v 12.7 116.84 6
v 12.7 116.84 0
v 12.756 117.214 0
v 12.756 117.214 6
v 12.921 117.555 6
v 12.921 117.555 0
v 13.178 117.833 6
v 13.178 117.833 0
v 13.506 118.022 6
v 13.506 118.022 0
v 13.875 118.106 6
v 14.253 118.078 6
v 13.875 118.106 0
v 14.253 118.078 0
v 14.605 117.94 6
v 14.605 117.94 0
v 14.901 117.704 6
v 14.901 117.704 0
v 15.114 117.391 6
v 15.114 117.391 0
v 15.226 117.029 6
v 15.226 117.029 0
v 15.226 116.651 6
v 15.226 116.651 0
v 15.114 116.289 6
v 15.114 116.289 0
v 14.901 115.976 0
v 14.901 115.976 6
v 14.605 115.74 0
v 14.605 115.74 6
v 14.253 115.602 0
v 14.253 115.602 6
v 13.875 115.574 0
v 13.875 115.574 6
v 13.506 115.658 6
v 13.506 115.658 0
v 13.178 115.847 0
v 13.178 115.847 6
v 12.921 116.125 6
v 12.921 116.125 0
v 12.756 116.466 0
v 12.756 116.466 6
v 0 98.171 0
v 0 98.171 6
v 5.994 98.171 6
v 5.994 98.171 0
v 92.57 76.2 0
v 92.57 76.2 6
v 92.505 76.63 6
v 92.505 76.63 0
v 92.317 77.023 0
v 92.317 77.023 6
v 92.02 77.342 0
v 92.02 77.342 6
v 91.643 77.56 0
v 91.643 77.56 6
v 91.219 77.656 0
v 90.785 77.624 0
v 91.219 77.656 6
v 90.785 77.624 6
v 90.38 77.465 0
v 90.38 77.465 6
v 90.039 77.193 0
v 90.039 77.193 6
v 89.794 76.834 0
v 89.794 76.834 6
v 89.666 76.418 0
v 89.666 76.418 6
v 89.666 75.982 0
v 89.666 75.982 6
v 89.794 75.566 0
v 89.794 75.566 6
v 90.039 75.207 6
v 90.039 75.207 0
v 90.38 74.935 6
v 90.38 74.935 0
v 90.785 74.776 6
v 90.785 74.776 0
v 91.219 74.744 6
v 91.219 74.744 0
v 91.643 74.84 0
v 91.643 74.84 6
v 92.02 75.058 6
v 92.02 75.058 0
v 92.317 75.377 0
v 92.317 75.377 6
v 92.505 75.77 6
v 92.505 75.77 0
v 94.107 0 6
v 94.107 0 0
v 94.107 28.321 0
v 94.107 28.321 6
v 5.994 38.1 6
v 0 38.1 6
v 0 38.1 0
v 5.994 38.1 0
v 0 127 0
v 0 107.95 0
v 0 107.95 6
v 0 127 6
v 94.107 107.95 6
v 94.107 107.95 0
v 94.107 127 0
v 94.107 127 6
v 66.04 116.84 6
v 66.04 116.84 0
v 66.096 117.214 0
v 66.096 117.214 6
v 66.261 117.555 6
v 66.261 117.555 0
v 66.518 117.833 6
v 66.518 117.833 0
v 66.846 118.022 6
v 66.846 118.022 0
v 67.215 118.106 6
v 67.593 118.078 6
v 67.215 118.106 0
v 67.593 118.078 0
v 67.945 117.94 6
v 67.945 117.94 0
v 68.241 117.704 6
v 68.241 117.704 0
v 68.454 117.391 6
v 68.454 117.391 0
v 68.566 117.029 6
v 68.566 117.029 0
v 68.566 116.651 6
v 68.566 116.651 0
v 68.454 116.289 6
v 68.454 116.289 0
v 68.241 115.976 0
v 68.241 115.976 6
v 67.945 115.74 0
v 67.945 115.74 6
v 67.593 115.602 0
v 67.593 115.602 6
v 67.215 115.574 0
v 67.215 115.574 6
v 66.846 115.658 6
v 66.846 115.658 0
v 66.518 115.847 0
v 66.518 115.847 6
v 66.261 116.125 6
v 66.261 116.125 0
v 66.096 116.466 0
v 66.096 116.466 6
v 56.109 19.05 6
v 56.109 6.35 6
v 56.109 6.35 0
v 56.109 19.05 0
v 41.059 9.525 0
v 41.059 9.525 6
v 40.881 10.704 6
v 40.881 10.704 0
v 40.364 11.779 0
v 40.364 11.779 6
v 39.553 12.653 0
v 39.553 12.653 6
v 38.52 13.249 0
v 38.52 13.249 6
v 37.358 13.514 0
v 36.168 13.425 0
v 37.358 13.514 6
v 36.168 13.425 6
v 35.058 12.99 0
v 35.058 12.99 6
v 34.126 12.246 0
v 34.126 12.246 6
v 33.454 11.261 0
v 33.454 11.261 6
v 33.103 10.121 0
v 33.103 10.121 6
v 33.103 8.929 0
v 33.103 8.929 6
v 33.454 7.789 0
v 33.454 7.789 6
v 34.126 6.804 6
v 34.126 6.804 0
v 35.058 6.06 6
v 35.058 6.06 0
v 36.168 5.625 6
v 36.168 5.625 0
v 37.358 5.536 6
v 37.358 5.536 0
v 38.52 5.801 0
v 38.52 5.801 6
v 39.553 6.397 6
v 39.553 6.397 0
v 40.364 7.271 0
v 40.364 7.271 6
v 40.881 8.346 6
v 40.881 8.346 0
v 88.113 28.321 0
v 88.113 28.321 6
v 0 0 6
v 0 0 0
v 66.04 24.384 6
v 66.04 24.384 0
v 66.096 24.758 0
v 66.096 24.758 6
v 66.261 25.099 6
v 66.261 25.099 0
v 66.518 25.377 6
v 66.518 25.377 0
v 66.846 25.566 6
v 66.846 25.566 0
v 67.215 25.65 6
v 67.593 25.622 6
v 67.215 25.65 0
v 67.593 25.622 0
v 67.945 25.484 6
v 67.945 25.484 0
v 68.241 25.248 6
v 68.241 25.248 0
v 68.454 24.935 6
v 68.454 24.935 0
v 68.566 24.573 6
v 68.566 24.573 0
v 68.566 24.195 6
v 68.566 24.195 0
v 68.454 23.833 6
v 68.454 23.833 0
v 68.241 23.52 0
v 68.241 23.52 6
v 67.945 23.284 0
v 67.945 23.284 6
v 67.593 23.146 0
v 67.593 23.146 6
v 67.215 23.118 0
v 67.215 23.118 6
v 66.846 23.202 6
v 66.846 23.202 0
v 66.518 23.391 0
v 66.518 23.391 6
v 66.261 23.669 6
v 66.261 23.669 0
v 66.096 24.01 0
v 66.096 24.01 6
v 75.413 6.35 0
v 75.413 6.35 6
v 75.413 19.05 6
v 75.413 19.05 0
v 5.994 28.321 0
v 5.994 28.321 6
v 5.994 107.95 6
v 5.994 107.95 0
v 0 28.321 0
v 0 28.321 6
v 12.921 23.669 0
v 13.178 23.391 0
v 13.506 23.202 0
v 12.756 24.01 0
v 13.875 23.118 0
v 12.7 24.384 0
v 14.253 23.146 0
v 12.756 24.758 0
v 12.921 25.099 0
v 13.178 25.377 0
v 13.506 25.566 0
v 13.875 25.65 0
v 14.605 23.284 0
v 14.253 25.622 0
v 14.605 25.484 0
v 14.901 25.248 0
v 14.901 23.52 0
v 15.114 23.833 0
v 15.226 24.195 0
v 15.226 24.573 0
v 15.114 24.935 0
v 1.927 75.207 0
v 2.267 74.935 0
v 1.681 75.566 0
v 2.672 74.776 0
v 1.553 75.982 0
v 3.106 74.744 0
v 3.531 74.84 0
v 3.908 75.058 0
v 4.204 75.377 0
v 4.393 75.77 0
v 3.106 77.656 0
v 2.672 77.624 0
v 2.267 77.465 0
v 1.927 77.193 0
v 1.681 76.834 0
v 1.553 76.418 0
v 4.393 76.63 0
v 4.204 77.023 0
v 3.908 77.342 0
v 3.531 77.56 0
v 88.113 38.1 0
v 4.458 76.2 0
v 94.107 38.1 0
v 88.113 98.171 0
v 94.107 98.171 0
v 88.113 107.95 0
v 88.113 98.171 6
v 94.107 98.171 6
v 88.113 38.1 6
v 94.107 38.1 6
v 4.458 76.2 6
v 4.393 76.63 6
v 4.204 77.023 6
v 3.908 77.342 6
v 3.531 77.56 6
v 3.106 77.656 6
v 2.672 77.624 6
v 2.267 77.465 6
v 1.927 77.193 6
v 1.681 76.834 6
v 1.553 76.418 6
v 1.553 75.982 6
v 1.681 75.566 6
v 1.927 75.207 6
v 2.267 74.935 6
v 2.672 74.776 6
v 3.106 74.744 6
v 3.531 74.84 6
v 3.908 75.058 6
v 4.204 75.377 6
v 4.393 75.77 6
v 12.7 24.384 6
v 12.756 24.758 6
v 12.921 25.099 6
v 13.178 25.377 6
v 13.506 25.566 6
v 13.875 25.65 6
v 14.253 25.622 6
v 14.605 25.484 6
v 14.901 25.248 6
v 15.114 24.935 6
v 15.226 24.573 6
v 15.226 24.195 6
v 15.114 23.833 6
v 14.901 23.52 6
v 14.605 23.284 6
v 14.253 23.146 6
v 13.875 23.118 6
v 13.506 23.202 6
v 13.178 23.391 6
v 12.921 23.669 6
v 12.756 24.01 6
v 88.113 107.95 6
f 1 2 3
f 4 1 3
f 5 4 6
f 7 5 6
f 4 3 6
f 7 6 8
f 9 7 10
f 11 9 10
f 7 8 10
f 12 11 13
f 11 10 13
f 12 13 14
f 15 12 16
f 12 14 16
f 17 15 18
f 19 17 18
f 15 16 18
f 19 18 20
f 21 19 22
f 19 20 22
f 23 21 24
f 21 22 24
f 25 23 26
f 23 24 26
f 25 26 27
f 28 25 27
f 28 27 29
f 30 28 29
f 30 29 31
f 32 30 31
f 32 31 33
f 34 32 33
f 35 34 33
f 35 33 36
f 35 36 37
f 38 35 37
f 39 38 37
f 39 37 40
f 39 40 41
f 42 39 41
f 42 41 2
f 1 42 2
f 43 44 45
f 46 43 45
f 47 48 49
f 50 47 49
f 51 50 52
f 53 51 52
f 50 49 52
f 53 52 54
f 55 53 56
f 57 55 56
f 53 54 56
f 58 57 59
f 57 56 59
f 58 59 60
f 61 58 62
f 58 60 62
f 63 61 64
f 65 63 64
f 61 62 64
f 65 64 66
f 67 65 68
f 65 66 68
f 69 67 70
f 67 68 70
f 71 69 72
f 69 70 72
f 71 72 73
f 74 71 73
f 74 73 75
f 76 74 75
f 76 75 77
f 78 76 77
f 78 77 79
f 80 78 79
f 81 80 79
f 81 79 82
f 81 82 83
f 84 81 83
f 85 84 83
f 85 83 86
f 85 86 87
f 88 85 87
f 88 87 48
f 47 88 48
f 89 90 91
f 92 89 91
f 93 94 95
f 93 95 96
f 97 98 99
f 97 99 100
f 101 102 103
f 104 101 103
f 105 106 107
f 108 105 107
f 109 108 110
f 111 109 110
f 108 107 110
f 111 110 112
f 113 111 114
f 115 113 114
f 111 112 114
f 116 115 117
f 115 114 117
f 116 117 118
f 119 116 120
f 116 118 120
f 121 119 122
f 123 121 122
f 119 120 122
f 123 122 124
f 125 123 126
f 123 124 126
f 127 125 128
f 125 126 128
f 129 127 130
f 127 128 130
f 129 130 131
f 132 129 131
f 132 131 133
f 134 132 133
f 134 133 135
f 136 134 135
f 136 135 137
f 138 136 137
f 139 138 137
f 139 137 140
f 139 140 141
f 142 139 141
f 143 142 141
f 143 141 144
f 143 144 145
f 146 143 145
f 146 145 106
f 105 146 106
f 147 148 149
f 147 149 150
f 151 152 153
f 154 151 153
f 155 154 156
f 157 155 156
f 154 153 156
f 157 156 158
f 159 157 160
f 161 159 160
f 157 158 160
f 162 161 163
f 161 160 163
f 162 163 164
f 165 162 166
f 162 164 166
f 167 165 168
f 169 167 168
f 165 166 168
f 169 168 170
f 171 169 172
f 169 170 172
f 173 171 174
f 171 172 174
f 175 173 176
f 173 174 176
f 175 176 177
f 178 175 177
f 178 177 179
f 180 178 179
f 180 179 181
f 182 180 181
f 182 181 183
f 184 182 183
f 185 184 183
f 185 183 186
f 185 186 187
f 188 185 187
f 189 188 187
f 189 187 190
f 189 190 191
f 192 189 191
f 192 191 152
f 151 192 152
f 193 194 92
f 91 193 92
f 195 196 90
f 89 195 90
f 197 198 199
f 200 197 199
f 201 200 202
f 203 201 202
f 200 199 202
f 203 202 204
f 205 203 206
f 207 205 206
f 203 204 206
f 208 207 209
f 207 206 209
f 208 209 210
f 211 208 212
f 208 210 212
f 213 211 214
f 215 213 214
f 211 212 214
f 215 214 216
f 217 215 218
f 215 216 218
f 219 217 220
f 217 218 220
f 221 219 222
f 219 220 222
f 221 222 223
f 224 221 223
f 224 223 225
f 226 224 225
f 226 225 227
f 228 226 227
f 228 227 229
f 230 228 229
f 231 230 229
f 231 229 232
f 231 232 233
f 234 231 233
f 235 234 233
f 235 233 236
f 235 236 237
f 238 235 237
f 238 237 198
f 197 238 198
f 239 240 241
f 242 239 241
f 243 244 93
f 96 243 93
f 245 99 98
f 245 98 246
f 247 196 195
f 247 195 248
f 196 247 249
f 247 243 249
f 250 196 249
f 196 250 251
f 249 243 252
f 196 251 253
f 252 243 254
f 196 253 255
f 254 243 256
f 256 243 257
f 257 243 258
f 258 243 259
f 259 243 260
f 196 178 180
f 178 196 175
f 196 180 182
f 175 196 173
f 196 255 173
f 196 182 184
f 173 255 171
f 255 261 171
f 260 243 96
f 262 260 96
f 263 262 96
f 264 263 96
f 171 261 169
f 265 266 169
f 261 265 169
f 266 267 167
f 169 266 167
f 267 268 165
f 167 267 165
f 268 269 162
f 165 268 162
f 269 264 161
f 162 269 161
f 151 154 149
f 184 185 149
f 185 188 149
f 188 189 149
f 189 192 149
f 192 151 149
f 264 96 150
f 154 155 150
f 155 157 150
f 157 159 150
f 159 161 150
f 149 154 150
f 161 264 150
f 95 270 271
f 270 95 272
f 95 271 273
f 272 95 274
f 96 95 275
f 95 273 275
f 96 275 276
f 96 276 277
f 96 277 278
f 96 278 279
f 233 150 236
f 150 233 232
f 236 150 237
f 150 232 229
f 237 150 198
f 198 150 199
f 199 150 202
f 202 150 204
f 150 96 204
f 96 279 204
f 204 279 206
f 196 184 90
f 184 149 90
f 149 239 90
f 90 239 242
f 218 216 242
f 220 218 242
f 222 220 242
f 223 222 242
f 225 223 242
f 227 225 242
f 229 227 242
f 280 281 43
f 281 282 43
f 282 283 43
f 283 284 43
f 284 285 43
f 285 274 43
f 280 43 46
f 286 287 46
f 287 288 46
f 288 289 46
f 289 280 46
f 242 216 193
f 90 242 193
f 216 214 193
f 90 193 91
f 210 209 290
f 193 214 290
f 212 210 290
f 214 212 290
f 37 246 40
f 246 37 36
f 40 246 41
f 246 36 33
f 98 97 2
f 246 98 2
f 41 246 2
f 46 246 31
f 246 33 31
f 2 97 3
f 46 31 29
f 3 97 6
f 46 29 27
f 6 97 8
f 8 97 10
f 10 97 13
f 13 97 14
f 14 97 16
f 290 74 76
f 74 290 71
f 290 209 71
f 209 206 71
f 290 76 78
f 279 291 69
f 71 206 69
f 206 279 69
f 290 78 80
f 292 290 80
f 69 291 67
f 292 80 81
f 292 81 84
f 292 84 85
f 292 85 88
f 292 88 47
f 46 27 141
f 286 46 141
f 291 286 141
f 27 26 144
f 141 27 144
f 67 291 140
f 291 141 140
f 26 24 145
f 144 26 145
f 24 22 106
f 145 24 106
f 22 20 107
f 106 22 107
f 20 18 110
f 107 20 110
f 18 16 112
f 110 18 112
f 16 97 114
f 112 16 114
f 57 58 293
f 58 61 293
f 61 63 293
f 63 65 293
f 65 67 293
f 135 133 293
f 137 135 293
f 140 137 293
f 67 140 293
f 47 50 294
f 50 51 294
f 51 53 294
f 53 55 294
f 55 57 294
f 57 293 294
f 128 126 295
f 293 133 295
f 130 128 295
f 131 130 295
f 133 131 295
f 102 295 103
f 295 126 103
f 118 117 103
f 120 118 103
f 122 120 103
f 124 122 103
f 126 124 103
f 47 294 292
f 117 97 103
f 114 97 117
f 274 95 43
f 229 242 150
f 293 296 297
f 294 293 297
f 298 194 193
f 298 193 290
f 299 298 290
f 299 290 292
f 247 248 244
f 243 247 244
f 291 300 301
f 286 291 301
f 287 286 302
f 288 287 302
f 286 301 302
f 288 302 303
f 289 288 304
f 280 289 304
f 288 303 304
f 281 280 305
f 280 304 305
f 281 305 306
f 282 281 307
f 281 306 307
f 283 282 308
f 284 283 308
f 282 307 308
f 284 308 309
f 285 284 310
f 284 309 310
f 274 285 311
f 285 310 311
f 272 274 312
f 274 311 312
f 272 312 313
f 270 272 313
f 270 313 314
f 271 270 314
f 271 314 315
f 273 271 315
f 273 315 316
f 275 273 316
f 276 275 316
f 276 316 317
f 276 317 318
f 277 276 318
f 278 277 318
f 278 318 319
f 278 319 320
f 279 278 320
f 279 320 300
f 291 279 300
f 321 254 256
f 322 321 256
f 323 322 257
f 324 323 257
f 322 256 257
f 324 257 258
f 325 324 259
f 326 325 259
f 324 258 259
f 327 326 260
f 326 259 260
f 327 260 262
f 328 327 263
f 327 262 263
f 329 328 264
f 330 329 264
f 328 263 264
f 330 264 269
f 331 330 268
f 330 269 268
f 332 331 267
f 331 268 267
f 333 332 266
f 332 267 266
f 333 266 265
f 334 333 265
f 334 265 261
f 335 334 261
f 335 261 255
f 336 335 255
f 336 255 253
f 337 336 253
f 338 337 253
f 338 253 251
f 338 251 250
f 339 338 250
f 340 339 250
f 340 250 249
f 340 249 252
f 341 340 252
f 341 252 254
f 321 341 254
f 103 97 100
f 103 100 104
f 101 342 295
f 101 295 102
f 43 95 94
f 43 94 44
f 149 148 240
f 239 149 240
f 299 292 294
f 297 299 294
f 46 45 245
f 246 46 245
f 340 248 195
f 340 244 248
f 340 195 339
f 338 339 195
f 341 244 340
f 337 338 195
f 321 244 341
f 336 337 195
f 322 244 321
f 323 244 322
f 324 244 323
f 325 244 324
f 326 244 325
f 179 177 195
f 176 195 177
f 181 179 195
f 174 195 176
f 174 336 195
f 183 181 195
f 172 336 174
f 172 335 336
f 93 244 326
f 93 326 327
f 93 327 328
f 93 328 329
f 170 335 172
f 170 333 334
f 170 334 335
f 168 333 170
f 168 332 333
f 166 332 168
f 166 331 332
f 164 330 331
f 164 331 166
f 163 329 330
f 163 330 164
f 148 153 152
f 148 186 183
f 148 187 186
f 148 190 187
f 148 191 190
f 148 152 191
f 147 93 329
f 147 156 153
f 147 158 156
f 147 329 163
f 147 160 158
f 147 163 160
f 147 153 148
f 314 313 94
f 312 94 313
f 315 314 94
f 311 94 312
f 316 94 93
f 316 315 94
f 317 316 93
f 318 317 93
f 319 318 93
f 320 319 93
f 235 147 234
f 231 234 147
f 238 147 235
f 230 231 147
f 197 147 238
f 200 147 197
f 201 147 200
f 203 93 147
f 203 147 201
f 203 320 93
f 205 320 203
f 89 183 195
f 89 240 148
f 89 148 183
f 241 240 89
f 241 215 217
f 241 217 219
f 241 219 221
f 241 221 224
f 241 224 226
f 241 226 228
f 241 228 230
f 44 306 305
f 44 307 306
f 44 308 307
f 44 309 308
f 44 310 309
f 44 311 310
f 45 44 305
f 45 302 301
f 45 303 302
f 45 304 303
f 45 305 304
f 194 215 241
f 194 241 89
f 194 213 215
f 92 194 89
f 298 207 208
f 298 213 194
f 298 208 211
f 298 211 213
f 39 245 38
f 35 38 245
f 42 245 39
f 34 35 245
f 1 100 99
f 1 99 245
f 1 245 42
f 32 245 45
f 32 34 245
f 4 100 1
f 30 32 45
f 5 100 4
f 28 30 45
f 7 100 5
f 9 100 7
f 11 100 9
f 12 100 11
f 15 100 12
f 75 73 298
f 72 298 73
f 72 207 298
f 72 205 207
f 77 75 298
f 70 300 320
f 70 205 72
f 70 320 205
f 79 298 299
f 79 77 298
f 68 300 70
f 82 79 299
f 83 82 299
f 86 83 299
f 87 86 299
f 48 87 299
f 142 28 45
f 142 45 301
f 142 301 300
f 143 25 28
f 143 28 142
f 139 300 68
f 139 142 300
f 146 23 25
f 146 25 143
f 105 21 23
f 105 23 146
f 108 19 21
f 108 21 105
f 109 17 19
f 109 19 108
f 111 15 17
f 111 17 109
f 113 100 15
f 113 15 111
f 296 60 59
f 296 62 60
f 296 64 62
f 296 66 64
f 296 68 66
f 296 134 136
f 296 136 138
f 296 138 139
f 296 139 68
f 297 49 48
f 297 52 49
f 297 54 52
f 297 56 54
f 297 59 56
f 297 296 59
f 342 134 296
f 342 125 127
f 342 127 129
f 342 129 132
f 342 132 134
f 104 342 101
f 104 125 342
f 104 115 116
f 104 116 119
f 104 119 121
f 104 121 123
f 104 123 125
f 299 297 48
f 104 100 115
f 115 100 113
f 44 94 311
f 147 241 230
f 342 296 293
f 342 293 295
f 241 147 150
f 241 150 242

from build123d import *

# Parameters (mm, degrees)
SKETCH1_W           = 94.107
SKETCH1_H           = 127
BOSS_EXTRUDE1_DEPTH = 6
SKETCH2_W           = 5.9944
SKETCH2_H           = 9.779
CUT_EXTRUDE1_DEPTH  = 159.180679759
SKETCH3_R           = 1.27
CUT_EXTRUDE2_DEPTH  = 159.180679759
SKETCH4_R           = 4.0005
SKETCH4_W           = 19.304
SKETCH4_H           = 12.7
CUT_EXTRUDE3_DEPTH  = 159.180679759
SKETCH5_R           = 1.4605
CUT_EXTRUDE4_DEPTH  = 159.180679759


with BuildPart() as part:
    # Sketch1 → Boss-Extrude1 (new body)
    with BuildSketch(Plane.XY):
        with Locations((47.0535, 63.5)):
            Rectangle(SKETCH1_W, SKETCH1_H)
    extrude(amount=BOSS_EXTRUDE1_DEPTH)

    # Sketch2 → Cut-Extrude1 (cut, through all)
    with BuildSketch(Plane.XY.offset(6)):
        with Locations((2.9972, 103.0605)):
            Rectangle(SKETCH2_W, SKETCH2_H)
        with Locations((91.1098, 103.0605)):
            Rectangle(SKETCH2_W, SKETCH2_H)
        with Locations((2.9972, 33.2105)):
            Rectangle(SKETCH2_W, SKETCH2_H)
        with Locations((91.1098, 33.2105)):
            Rectangle(SKETCH2_W, SKETCH2_H)
    extrude(amount=-CUT_EXTRUDE1_DEPTH, mode=Mode.SUBTRACT)

    # Sketch3 → Cut-Extrude2 (cut, through all)
    with BuildSketch(Plane(origin=(0, 0, 0), x_dir=(-1, 0, 0), z_dir=(0, 0, -1))):
        with Locations((-67.31, 24.384)):
            Circle(SKETCH3_R)
        with Locations((-67.31, 116.84)):
            Circle(SKETCH3_R)
        with Locations((-13.97, 116.84)):
            Circle(SKETCH3_R)
        with Locations((-13.97, 24.384)):
            Circle(SKETCH3_R)
    extrude(amount=-CUT_EXTRUDE2_DEPTH, mode=Mode.SUBTRACT)

    # Sketch4 → Cut-Extrude3 (cut, through all)
    with BuildSketch(Plane.XY.offset(6)):
        with Locations((37.0586, 9.525)):
            Circle(SKETCH4_R)
        with Locations((65.7606, 12.7)):
            Rectangle(SKETCH4_W, SKETCH4_H)
    extrude(amount=-CUT_EXTRUDE3_DEPTH, mode=Mode.SUBTRACT)

    # Sketch5 → Cut-Extrude4 (cut, through all)
    with BuildSketch(Plane.XY.offset(6)):
        with Locations((2.9972, 76.2)):
            Circle(SKETCH5_R)
        with Locations((91.1098, 76.2)):
            Circle(SKETCH5_R)
    extrude(amount=-CUT_EXTRUDE4_DEPTH, mode=Mode.SUBTRACT)


solid = part.part
